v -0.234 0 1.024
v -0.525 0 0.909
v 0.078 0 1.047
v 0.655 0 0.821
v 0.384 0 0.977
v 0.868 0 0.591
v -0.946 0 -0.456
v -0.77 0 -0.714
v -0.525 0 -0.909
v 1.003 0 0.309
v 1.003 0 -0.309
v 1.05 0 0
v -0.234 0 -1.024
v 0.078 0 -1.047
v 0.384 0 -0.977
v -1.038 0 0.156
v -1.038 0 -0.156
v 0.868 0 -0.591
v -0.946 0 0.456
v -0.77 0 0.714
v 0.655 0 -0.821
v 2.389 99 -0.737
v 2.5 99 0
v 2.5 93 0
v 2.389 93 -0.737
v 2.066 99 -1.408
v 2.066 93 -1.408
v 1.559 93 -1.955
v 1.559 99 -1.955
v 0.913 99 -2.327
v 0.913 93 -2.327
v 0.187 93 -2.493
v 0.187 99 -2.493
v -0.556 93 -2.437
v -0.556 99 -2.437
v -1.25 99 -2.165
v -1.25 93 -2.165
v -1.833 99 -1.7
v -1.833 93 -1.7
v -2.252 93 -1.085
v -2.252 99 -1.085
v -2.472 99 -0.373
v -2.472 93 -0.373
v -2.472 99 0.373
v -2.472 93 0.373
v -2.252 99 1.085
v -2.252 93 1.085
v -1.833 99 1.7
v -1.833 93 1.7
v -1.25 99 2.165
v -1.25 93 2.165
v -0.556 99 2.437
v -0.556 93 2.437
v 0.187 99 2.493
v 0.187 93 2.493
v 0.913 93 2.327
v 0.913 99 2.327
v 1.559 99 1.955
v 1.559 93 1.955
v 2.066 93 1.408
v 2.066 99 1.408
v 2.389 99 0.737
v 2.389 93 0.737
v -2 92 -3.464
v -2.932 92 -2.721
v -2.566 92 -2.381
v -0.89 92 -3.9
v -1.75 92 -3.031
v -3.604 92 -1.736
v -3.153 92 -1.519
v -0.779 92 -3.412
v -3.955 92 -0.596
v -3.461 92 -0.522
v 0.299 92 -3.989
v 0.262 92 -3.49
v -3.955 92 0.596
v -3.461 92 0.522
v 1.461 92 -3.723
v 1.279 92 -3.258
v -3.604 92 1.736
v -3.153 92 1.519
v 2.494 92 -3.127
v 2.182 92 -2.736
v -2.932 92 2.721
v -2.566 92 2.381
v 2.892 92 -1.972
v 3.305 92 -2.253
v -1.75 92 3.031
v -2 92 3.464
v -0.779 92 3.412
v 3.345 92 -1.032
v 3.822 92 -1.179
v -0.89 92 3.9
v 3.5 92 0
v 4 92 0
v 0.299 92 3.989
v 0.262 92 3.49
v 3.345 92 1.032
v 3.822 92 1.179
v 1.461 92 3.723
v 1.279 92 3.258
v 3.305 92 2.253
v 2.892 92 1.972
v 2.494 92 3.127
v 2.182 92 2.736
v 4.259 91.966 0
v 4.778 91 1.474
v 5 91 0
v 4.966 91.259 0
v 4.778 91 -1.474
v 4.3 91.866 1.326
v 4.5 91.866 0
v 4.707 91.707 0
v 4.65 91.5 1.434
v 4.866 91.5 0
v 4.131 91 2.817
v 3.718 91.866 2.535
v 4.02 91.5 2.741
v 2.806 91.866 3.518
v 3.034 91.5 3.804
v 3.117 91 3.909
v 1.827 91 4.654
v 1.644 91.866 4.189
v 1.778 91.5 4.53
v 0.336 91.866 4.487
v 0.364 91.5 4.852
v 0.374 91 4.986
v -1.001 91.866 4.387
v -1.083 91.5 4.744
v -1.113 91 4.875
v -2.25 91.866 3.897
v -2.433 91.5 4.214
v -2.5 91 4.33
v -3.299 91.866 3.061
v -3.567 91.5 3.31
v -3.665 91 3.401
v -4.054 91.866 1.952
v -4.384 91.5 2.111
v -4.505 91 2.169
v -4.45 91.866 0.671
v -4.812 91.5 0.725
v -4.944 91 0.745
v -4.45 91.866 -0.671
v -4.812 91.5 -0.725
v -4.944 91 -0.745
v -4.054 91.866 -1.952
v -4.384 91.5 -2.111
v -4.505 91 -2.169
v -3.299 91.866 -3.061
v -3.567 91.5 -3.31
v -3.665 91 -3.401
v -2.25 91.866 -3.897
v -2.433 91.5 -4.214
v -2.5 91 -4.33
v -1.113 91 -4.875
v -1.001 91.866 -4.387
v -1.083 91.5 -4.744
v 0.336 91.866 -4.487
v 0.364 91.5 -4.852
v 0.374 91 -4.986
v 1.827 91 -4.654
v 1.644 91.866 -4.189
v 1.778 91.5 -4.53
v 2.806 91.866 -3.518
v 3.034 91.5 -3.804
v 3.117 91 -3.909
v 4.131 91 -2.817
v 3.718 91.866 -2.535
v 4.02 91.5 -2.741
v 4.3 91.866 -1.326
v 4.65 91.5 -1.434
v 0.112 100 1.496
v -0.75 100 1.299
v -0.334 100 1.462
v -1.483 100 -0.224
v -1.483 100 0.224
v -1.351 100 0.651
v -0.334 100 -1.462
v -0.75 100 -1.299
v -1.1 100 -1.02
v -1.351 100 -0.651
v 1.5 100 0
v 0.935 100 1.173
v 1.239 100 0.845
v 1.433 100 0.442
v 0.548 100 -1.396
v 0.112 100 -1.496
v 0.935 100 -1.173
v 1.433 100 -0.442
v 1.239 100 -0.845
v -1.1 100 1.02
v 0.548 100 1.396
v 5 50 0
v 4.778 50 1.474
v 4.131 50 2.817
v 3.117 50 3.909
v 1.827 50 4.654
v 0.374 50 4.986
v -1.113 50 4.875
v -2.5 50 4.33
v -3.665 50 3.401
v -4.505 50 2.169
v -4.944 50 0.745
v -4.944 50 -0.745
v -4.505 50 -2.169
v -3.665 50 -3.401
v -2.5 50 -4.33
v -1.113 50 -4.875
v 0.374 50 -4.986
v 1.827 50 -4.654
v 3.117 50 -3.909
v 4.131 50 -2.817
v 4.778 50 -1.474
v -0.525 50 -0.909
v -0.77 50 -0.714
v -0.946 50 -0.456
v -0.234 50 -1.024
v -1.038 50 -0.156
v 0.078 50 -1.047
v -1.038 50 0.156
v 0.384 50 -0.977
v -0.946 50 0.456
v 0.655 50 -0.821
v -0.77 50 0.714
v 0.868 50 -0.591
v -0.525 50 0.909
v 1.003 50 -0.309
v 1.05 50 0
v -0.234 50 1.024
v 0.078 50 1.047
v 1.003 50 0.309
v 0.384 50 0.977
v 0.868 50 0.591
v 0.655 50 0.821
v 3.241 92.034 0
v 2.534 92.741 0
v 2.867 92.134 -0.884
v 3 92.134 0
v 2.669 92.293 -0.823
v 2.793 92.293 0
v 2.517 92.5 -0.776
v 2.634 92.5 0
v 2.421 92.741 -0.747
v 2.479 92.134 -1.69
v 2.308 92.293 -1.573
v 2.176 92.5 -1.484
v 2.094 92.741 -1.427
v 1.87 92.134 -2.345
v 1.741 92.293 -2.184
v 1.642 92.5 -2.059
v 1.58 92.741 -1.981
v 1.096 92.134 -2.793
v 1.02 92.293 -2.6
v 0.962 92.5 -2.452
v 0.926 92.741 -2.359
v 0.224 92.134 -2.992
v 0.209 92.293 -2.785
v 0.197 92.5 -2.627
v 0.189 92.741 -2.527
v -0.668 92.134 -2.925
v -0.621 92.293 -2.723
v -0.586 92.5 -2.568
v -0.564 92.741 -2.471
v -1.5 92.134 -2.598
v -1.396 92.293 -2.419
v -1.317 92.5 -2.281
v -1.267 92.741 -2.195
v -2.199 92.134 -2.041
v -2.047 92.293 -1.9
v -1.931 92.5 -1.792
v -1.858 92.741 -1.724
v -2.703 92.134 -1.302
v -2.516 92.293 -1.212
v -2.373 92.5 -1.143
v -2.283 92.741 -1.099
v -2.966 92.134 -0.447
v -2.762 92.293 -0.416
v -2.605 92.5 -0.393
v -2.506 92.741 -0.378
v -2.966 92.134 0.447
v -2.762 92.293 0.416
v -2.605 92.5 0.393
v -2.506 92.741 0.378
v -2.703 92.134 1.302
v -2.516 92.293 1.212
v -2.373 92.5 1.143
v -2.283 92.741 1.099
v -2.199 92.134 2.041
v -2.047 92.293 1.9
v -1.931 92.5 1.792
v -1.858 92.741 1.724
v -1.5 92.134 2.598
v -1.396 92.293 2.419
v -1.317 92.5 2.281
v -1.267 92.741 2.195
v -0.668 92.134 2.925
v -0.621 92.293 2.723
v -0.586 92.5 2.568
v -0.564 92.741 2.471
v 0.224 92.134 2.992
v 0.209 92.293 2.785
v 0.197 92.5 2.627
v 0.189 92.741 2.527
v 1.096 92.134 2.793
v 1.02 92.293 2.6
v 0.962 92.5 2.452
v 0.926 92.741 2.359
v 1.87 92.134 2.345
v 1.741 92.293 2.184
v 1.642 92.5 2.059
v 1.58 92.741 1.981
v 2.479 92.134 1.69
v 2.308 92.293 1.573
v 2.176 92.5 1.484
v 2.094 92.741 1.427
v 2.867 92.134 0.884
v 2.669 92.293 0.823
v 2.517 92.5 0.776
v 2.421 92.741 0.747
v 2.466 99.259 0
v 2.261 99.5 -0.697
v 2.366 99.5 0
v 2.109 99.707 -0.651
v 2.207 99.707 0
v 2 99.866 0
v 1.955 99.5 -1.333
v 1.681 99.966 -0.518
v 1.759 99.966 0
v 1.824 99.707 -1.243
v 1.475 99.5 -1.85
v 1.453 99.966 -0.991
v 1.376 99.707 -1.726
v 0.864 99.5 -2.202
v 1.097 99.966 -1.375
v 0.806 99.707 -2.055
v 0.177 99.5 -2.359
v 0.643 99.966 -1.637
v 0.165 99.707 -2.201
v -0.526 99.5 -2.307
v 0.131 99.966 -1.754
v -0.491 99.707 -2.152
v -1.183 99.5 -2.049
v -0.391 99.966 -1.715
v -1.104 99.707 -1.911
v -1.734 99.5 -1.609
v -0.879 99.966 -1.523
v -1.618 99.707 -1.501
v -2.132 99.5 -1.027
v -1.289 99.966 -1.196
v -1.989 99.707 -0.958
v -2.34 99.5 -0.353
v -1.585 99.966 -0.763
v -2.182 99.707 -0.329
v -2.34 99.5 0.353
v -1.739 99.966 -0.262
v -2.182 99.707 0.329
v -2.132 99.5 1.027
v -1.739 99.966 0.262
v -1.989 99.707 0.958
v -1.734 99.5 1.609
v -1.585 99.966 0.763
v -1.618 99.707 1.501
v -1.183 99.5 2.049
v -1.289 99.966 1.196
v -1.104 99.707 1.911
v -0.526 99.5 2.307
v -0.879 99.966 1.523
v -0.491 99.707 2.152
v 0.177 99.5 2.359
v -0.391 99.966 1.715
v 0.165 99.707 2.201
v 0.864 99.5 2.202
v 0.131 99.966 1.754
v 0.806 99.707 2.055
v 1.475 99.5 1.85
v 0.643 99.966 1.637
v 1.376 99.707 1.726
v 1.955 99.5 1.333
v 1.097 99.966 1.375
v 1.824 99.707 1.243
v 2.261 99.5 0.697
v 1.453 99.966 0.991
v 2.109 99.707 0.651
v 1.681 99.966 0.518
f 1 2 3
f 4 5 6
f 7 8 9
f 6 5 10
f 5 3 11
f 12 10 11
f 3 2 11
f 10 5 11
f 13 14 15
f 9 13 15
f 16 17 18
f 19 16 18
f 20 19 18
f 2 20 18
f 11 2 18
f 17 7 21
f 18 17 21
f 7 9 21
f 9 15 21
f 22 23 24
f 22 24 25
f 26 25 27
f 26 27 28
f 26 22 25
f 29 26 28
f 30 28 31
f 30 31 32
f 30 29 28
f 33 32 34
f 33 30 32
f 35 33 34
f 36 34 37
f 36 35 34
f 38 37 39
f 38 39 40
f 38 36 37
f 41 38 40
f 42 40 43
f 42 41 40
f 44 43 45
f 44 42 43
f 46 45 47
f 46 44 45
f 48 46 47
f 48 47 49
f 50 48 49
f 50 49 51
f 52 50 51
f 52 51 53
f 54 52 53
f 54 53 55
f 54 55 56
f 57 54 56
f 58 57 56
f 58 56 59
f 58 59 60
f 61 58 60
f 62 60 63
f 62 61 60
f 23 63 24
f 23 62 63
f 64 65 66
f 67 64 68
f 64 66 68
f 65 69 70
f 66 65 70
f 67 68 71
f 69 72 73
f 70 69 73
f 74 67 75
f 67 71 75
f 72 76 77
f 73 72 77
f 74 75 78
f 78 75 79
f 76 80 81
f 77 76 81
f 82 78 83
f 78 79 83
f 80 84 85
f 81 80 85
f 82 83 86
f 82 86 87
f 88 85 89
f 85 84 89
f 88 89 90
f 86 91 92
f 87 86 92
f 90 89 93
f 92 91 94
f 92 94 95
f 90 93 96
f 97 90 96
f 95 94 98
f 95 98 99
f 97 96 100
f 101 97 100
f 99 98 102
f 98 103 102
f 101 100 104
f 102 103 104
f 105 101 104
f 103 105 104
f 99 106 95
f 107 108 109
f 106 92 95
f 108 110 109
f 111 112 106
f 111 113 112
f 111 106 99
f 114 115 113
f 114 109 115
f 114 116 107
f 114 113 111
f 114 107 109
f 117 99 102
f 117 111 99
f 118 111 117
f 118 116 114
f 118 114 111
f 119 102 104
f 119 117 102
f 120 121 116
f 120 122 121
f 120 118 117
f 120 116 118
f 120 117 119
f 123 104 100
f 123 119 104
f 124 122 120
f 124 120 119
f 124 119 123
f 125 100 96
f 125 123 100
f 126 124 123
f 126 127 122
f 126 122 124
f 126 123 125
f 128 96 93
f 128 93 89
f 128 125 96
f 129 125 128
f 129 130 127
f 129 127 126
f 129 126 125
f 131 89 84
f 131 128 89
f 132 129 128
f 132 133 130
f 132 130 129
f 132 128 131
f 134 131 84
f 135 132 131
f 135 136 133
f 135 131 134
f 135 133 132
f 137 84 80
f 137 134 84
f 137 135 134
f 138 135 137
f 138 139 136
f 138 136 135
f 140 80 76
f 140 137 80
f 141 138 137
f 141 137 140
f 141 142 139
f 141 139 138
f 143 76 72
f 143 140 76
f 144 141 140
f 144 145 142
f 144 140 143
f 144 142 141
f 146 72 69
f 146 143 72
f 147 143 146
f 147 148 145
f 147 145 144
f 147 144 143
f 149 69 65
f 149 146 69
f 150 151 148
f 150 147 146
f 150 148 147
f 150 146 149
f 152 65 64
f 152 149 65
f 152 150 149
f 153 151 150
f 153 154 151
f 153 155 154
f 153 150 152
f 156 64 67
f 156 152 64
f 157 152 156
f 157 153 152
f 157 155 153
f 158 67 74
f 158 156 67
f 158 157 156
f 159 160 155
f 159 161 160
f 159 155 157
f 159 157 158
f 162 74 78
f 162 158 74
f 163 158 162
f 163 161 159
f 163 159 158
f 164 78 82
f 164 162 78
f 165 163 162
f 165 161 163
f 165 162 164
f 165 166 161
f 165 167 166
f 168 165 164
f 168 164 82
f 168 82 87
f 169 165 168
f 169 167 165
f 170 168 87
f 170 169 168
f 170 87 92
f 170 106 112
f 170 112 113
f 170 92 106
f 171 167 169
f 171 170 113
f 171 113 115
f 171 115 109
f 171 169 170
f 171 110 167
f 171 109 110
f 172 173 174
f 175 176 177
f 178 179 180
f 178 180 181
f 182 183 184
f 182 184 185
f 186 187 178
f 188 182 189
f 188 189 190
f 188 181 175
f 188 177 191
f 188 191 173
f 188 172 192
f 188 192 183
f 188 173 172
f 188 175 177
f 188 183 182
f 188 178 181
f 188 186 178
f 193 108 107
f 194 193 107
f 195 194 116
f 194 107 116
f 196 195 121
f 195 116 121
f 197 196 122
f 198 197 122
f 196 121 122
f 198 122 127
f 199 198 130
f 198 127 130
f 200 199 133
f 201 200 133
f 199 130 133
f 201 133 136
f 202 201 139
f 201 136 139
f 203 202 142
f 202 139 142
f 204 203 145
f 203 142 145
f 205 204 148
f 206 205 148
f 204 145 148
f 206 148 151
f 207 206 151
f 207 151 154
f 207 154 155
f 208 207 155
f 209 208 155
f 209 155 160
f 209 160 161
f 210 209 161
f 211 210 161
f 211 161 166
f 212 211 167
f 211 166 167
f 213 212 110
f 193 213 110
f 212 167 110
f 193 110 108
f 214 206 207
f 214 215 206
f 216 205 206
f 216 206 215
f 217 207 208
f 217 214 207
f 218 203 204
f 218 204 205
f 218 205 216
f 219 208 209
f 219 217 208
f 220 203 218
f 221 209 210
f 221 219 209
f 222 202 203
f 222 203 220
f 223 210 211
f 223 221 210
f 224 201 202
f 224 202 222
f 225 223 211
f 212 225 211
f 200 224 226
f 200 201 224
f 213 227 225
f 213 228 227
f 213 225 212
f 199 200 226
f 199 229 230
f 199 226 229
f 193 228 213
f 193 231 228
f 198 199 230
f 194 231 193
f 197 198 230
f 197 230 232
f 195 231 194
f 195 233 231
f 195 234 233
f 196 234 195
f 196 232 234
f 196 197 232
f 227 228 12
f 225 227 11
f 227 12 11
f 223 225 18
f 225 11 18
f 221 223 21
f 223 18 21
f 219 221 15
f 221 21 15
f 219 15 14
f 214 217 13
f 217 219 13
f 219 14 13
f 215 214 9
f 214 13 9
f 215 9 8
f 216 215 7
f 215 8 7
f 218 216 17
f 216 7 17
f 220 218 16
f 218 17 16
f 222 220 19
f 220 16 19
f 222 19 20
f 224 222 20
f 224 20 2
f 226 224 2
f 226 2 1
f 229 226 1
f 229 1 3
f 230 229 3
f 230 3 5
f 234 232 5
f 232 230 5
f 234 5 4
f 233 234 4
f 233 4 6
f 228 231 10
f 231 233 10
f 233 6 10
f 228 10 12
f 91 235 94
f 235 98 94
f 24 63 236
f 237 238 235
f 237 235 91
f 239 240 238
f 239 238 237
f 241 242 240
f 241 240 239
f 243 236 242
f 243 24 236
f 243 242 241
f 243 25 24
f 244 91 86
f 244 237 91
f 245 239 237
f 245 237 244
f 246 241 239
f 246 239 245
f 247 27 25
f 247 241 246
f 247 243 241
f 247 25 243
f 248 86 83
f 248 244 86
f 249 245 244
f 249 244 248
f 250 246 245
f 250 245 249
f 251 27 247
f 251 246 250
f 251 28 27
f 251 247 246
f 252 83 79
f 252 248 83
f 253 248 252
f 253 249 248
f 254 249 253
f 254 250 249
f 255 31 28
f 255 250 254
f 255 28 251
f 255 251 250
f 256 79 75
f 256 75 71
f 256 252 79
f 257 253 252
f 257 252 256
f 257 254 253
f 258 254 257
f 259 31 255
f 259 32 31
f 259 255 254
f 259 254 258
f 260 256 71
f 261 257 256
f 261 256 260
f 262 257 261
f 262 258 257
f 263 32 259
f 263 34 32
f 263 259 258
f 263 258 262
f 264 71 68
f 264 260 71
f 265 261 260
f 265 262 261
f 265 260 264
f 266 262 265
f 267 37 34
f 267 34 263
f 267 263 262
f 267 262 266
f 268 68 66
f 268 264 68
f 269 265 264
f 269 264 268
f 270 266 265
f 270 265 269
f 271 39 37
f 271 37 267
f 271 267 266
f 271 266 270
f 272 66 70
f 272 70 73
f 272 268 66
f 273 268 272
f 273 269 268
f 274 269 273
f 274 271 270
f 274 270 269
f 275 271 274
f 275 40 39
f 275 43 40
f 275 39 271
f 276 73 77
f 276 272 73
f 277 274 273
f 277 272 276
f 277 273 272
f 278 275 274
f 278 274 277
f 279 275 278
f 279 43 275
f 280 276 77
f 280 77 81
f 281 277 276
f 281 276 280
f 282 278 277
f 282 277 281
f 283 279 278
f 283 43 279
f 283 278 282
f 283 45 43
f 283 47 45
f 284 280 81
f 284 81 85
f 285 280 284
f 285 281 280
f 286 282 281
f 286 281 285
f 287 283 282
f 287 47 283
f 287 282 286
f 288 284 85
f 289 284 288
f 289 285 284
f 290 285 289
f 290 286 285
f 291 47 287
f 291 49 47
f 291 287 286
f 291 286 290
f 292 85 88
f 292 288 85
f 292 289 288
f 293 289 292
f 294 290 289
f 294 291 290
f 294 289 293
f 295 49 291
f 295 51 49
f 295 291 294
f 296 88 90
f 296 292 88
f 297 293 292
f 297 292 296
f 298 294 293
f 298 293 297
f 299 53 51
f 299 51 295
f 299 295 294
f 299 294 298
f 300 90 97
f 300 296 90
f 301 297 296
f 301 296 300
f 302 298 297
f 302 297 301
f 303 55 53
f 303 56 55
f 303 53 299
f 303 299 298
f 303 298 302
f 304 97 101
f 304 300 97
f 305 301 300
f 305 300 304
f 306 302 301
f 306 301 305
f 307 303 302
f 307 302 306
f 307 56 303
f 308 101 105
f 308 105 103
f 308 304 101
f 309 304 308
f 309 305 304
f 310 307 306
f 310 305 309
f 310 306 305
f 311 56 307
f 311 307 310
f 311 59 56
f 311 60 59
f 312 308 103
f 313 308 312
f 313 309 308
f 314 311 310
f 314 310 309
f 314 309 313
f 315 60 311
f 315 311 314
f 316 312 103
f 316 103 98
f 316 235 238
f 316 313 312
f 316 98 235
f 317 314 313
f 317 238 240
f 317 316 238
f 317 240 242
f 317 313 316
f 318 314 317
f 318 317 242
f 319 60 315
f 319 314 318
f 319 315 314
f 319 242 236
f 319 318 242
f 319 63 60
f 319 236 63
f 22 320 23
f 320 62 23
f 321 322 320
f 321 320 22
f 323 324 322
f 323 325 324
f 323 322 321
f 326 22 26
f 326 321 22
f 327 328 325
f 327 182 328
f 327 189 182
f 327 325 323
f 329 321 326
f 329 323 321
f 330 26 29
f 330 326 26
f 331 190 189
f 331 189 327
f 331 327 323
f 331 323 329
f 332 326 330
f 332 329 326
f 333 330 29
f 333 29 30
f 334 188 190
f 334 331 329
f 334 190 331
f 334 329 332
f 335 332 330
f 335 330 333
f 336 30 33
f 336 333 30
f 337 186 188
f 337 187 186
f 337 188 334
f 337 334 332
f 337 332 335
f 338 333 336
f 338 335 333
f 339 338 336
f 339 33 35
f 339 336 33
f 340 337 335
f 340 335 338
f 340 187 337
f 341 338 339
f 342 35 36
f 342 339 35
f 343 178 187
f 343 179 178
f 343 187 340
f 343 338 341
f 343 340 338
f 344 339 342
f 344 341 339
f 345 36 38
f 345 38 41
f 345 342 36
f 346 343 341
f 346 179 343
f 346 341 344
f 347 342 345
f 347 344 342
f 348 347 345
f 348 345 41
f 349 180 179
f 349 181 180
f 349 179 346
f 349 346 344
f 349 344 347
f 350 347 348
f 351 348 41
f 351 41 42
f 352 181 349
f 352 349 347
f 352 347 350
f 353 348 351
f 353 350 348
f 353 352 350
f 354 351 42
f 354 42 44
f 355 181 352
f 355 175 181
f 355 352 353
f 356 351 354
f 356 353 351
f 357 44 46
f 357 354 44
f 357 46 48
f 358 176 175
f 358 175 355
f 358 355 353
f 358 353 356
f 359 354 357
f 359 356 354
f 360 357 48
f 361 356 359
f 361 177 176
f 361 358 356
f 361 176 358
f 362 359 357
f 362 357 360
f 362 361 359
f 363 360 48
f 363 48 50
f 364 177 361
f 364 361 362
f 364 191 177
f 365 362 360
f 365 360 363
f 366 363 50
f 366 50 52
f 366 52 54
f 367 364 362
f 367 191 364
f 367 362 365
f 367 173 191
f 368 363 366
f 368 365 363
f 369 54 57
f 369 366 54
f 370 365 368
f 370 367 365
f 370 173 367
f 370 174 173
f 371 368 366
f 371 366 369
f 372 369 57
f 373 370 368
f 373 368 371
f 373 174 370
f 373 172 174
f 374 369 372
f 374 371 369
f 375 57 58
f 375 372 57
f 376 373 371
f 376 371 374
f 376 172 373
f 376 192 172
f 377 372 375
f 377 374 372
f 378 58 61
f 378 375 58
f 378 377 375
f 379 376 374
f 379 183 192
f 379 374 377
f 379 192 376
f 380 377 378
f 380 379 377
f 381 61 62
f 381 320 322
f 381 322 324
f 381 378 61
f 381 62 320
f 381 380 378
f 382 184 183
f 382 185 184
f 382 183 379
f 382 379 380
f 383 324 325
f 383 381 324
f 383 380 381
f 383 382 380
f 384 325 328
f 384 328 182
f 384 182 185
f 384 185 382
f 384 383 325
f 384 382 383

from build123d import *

# Parameters (mm, degrees)
ESQUISSE2_R        = 1.05
BOSS_EXTRU_1_DEPTH = 100
ESQUISSE3_R        = 2.5
BOSS_EXTRU_2_DEPTH = 8
ESQUISSE4_R        = 5
BOSS_EXTRU_3_DEPTH = 42
CONG_4_R           = 1
CONG_5_R           = 1
CONG_6_R           = 1


with BuildPart() as part:
    # Esquisse2 → Boss.-Extru.1 (new body)
    with BuildSketch(Plane(origin=(0, 0, 0), x_dir=(1, 0, 0), z_dir=(0, 1, 0))):
        Circle(ESQUISSE2_R)
    extrude(amount=BOSS_EXTRU_1_DEPTH)

    # Esquisse3 → Boss.-Extru.2 (add)
    with BuildSketch(Plane(origin=(0, 100, 0), x_dir=(1, 0, 0), z_dir=(0, 1, 0))):
        Circle(ESQUISSE3_R)
    extrude(amount=-BOSS_EXTRU_2_DEPTH)

    # Esquisse4 → Boss.-Extru.3 (add)
    with BuildSketch(Plane.XZ.offset(-92)):
        Circle(ESQUISSE4_R)
    extrude(amount=BOSS_EXTRU_3_DEPTH)

    # Congé4
    cong_4_edges = [part.edges().sort_by_distance(p)[0] for p in [
        (-2.5, 100, 0),
    ]]
    fillet(cong_4_edges, radius=CONG_4_R)

    # Congé5
    cong_5_edges = [part.edges().sort_by_distance(p)[0] for p in [
        (-5, 92, 0),
    ]]
    fillet(cong_5_edges, radius=CONG_5_R)

    # Congé6
    cong_6_edges = [part.edges().sort_by_distance(p)[0] for p in [
        (-2.5, 92, 0),
    ]]
    fillet(cong_6_edges, radius=CONG_6_R)


solid = part.part
